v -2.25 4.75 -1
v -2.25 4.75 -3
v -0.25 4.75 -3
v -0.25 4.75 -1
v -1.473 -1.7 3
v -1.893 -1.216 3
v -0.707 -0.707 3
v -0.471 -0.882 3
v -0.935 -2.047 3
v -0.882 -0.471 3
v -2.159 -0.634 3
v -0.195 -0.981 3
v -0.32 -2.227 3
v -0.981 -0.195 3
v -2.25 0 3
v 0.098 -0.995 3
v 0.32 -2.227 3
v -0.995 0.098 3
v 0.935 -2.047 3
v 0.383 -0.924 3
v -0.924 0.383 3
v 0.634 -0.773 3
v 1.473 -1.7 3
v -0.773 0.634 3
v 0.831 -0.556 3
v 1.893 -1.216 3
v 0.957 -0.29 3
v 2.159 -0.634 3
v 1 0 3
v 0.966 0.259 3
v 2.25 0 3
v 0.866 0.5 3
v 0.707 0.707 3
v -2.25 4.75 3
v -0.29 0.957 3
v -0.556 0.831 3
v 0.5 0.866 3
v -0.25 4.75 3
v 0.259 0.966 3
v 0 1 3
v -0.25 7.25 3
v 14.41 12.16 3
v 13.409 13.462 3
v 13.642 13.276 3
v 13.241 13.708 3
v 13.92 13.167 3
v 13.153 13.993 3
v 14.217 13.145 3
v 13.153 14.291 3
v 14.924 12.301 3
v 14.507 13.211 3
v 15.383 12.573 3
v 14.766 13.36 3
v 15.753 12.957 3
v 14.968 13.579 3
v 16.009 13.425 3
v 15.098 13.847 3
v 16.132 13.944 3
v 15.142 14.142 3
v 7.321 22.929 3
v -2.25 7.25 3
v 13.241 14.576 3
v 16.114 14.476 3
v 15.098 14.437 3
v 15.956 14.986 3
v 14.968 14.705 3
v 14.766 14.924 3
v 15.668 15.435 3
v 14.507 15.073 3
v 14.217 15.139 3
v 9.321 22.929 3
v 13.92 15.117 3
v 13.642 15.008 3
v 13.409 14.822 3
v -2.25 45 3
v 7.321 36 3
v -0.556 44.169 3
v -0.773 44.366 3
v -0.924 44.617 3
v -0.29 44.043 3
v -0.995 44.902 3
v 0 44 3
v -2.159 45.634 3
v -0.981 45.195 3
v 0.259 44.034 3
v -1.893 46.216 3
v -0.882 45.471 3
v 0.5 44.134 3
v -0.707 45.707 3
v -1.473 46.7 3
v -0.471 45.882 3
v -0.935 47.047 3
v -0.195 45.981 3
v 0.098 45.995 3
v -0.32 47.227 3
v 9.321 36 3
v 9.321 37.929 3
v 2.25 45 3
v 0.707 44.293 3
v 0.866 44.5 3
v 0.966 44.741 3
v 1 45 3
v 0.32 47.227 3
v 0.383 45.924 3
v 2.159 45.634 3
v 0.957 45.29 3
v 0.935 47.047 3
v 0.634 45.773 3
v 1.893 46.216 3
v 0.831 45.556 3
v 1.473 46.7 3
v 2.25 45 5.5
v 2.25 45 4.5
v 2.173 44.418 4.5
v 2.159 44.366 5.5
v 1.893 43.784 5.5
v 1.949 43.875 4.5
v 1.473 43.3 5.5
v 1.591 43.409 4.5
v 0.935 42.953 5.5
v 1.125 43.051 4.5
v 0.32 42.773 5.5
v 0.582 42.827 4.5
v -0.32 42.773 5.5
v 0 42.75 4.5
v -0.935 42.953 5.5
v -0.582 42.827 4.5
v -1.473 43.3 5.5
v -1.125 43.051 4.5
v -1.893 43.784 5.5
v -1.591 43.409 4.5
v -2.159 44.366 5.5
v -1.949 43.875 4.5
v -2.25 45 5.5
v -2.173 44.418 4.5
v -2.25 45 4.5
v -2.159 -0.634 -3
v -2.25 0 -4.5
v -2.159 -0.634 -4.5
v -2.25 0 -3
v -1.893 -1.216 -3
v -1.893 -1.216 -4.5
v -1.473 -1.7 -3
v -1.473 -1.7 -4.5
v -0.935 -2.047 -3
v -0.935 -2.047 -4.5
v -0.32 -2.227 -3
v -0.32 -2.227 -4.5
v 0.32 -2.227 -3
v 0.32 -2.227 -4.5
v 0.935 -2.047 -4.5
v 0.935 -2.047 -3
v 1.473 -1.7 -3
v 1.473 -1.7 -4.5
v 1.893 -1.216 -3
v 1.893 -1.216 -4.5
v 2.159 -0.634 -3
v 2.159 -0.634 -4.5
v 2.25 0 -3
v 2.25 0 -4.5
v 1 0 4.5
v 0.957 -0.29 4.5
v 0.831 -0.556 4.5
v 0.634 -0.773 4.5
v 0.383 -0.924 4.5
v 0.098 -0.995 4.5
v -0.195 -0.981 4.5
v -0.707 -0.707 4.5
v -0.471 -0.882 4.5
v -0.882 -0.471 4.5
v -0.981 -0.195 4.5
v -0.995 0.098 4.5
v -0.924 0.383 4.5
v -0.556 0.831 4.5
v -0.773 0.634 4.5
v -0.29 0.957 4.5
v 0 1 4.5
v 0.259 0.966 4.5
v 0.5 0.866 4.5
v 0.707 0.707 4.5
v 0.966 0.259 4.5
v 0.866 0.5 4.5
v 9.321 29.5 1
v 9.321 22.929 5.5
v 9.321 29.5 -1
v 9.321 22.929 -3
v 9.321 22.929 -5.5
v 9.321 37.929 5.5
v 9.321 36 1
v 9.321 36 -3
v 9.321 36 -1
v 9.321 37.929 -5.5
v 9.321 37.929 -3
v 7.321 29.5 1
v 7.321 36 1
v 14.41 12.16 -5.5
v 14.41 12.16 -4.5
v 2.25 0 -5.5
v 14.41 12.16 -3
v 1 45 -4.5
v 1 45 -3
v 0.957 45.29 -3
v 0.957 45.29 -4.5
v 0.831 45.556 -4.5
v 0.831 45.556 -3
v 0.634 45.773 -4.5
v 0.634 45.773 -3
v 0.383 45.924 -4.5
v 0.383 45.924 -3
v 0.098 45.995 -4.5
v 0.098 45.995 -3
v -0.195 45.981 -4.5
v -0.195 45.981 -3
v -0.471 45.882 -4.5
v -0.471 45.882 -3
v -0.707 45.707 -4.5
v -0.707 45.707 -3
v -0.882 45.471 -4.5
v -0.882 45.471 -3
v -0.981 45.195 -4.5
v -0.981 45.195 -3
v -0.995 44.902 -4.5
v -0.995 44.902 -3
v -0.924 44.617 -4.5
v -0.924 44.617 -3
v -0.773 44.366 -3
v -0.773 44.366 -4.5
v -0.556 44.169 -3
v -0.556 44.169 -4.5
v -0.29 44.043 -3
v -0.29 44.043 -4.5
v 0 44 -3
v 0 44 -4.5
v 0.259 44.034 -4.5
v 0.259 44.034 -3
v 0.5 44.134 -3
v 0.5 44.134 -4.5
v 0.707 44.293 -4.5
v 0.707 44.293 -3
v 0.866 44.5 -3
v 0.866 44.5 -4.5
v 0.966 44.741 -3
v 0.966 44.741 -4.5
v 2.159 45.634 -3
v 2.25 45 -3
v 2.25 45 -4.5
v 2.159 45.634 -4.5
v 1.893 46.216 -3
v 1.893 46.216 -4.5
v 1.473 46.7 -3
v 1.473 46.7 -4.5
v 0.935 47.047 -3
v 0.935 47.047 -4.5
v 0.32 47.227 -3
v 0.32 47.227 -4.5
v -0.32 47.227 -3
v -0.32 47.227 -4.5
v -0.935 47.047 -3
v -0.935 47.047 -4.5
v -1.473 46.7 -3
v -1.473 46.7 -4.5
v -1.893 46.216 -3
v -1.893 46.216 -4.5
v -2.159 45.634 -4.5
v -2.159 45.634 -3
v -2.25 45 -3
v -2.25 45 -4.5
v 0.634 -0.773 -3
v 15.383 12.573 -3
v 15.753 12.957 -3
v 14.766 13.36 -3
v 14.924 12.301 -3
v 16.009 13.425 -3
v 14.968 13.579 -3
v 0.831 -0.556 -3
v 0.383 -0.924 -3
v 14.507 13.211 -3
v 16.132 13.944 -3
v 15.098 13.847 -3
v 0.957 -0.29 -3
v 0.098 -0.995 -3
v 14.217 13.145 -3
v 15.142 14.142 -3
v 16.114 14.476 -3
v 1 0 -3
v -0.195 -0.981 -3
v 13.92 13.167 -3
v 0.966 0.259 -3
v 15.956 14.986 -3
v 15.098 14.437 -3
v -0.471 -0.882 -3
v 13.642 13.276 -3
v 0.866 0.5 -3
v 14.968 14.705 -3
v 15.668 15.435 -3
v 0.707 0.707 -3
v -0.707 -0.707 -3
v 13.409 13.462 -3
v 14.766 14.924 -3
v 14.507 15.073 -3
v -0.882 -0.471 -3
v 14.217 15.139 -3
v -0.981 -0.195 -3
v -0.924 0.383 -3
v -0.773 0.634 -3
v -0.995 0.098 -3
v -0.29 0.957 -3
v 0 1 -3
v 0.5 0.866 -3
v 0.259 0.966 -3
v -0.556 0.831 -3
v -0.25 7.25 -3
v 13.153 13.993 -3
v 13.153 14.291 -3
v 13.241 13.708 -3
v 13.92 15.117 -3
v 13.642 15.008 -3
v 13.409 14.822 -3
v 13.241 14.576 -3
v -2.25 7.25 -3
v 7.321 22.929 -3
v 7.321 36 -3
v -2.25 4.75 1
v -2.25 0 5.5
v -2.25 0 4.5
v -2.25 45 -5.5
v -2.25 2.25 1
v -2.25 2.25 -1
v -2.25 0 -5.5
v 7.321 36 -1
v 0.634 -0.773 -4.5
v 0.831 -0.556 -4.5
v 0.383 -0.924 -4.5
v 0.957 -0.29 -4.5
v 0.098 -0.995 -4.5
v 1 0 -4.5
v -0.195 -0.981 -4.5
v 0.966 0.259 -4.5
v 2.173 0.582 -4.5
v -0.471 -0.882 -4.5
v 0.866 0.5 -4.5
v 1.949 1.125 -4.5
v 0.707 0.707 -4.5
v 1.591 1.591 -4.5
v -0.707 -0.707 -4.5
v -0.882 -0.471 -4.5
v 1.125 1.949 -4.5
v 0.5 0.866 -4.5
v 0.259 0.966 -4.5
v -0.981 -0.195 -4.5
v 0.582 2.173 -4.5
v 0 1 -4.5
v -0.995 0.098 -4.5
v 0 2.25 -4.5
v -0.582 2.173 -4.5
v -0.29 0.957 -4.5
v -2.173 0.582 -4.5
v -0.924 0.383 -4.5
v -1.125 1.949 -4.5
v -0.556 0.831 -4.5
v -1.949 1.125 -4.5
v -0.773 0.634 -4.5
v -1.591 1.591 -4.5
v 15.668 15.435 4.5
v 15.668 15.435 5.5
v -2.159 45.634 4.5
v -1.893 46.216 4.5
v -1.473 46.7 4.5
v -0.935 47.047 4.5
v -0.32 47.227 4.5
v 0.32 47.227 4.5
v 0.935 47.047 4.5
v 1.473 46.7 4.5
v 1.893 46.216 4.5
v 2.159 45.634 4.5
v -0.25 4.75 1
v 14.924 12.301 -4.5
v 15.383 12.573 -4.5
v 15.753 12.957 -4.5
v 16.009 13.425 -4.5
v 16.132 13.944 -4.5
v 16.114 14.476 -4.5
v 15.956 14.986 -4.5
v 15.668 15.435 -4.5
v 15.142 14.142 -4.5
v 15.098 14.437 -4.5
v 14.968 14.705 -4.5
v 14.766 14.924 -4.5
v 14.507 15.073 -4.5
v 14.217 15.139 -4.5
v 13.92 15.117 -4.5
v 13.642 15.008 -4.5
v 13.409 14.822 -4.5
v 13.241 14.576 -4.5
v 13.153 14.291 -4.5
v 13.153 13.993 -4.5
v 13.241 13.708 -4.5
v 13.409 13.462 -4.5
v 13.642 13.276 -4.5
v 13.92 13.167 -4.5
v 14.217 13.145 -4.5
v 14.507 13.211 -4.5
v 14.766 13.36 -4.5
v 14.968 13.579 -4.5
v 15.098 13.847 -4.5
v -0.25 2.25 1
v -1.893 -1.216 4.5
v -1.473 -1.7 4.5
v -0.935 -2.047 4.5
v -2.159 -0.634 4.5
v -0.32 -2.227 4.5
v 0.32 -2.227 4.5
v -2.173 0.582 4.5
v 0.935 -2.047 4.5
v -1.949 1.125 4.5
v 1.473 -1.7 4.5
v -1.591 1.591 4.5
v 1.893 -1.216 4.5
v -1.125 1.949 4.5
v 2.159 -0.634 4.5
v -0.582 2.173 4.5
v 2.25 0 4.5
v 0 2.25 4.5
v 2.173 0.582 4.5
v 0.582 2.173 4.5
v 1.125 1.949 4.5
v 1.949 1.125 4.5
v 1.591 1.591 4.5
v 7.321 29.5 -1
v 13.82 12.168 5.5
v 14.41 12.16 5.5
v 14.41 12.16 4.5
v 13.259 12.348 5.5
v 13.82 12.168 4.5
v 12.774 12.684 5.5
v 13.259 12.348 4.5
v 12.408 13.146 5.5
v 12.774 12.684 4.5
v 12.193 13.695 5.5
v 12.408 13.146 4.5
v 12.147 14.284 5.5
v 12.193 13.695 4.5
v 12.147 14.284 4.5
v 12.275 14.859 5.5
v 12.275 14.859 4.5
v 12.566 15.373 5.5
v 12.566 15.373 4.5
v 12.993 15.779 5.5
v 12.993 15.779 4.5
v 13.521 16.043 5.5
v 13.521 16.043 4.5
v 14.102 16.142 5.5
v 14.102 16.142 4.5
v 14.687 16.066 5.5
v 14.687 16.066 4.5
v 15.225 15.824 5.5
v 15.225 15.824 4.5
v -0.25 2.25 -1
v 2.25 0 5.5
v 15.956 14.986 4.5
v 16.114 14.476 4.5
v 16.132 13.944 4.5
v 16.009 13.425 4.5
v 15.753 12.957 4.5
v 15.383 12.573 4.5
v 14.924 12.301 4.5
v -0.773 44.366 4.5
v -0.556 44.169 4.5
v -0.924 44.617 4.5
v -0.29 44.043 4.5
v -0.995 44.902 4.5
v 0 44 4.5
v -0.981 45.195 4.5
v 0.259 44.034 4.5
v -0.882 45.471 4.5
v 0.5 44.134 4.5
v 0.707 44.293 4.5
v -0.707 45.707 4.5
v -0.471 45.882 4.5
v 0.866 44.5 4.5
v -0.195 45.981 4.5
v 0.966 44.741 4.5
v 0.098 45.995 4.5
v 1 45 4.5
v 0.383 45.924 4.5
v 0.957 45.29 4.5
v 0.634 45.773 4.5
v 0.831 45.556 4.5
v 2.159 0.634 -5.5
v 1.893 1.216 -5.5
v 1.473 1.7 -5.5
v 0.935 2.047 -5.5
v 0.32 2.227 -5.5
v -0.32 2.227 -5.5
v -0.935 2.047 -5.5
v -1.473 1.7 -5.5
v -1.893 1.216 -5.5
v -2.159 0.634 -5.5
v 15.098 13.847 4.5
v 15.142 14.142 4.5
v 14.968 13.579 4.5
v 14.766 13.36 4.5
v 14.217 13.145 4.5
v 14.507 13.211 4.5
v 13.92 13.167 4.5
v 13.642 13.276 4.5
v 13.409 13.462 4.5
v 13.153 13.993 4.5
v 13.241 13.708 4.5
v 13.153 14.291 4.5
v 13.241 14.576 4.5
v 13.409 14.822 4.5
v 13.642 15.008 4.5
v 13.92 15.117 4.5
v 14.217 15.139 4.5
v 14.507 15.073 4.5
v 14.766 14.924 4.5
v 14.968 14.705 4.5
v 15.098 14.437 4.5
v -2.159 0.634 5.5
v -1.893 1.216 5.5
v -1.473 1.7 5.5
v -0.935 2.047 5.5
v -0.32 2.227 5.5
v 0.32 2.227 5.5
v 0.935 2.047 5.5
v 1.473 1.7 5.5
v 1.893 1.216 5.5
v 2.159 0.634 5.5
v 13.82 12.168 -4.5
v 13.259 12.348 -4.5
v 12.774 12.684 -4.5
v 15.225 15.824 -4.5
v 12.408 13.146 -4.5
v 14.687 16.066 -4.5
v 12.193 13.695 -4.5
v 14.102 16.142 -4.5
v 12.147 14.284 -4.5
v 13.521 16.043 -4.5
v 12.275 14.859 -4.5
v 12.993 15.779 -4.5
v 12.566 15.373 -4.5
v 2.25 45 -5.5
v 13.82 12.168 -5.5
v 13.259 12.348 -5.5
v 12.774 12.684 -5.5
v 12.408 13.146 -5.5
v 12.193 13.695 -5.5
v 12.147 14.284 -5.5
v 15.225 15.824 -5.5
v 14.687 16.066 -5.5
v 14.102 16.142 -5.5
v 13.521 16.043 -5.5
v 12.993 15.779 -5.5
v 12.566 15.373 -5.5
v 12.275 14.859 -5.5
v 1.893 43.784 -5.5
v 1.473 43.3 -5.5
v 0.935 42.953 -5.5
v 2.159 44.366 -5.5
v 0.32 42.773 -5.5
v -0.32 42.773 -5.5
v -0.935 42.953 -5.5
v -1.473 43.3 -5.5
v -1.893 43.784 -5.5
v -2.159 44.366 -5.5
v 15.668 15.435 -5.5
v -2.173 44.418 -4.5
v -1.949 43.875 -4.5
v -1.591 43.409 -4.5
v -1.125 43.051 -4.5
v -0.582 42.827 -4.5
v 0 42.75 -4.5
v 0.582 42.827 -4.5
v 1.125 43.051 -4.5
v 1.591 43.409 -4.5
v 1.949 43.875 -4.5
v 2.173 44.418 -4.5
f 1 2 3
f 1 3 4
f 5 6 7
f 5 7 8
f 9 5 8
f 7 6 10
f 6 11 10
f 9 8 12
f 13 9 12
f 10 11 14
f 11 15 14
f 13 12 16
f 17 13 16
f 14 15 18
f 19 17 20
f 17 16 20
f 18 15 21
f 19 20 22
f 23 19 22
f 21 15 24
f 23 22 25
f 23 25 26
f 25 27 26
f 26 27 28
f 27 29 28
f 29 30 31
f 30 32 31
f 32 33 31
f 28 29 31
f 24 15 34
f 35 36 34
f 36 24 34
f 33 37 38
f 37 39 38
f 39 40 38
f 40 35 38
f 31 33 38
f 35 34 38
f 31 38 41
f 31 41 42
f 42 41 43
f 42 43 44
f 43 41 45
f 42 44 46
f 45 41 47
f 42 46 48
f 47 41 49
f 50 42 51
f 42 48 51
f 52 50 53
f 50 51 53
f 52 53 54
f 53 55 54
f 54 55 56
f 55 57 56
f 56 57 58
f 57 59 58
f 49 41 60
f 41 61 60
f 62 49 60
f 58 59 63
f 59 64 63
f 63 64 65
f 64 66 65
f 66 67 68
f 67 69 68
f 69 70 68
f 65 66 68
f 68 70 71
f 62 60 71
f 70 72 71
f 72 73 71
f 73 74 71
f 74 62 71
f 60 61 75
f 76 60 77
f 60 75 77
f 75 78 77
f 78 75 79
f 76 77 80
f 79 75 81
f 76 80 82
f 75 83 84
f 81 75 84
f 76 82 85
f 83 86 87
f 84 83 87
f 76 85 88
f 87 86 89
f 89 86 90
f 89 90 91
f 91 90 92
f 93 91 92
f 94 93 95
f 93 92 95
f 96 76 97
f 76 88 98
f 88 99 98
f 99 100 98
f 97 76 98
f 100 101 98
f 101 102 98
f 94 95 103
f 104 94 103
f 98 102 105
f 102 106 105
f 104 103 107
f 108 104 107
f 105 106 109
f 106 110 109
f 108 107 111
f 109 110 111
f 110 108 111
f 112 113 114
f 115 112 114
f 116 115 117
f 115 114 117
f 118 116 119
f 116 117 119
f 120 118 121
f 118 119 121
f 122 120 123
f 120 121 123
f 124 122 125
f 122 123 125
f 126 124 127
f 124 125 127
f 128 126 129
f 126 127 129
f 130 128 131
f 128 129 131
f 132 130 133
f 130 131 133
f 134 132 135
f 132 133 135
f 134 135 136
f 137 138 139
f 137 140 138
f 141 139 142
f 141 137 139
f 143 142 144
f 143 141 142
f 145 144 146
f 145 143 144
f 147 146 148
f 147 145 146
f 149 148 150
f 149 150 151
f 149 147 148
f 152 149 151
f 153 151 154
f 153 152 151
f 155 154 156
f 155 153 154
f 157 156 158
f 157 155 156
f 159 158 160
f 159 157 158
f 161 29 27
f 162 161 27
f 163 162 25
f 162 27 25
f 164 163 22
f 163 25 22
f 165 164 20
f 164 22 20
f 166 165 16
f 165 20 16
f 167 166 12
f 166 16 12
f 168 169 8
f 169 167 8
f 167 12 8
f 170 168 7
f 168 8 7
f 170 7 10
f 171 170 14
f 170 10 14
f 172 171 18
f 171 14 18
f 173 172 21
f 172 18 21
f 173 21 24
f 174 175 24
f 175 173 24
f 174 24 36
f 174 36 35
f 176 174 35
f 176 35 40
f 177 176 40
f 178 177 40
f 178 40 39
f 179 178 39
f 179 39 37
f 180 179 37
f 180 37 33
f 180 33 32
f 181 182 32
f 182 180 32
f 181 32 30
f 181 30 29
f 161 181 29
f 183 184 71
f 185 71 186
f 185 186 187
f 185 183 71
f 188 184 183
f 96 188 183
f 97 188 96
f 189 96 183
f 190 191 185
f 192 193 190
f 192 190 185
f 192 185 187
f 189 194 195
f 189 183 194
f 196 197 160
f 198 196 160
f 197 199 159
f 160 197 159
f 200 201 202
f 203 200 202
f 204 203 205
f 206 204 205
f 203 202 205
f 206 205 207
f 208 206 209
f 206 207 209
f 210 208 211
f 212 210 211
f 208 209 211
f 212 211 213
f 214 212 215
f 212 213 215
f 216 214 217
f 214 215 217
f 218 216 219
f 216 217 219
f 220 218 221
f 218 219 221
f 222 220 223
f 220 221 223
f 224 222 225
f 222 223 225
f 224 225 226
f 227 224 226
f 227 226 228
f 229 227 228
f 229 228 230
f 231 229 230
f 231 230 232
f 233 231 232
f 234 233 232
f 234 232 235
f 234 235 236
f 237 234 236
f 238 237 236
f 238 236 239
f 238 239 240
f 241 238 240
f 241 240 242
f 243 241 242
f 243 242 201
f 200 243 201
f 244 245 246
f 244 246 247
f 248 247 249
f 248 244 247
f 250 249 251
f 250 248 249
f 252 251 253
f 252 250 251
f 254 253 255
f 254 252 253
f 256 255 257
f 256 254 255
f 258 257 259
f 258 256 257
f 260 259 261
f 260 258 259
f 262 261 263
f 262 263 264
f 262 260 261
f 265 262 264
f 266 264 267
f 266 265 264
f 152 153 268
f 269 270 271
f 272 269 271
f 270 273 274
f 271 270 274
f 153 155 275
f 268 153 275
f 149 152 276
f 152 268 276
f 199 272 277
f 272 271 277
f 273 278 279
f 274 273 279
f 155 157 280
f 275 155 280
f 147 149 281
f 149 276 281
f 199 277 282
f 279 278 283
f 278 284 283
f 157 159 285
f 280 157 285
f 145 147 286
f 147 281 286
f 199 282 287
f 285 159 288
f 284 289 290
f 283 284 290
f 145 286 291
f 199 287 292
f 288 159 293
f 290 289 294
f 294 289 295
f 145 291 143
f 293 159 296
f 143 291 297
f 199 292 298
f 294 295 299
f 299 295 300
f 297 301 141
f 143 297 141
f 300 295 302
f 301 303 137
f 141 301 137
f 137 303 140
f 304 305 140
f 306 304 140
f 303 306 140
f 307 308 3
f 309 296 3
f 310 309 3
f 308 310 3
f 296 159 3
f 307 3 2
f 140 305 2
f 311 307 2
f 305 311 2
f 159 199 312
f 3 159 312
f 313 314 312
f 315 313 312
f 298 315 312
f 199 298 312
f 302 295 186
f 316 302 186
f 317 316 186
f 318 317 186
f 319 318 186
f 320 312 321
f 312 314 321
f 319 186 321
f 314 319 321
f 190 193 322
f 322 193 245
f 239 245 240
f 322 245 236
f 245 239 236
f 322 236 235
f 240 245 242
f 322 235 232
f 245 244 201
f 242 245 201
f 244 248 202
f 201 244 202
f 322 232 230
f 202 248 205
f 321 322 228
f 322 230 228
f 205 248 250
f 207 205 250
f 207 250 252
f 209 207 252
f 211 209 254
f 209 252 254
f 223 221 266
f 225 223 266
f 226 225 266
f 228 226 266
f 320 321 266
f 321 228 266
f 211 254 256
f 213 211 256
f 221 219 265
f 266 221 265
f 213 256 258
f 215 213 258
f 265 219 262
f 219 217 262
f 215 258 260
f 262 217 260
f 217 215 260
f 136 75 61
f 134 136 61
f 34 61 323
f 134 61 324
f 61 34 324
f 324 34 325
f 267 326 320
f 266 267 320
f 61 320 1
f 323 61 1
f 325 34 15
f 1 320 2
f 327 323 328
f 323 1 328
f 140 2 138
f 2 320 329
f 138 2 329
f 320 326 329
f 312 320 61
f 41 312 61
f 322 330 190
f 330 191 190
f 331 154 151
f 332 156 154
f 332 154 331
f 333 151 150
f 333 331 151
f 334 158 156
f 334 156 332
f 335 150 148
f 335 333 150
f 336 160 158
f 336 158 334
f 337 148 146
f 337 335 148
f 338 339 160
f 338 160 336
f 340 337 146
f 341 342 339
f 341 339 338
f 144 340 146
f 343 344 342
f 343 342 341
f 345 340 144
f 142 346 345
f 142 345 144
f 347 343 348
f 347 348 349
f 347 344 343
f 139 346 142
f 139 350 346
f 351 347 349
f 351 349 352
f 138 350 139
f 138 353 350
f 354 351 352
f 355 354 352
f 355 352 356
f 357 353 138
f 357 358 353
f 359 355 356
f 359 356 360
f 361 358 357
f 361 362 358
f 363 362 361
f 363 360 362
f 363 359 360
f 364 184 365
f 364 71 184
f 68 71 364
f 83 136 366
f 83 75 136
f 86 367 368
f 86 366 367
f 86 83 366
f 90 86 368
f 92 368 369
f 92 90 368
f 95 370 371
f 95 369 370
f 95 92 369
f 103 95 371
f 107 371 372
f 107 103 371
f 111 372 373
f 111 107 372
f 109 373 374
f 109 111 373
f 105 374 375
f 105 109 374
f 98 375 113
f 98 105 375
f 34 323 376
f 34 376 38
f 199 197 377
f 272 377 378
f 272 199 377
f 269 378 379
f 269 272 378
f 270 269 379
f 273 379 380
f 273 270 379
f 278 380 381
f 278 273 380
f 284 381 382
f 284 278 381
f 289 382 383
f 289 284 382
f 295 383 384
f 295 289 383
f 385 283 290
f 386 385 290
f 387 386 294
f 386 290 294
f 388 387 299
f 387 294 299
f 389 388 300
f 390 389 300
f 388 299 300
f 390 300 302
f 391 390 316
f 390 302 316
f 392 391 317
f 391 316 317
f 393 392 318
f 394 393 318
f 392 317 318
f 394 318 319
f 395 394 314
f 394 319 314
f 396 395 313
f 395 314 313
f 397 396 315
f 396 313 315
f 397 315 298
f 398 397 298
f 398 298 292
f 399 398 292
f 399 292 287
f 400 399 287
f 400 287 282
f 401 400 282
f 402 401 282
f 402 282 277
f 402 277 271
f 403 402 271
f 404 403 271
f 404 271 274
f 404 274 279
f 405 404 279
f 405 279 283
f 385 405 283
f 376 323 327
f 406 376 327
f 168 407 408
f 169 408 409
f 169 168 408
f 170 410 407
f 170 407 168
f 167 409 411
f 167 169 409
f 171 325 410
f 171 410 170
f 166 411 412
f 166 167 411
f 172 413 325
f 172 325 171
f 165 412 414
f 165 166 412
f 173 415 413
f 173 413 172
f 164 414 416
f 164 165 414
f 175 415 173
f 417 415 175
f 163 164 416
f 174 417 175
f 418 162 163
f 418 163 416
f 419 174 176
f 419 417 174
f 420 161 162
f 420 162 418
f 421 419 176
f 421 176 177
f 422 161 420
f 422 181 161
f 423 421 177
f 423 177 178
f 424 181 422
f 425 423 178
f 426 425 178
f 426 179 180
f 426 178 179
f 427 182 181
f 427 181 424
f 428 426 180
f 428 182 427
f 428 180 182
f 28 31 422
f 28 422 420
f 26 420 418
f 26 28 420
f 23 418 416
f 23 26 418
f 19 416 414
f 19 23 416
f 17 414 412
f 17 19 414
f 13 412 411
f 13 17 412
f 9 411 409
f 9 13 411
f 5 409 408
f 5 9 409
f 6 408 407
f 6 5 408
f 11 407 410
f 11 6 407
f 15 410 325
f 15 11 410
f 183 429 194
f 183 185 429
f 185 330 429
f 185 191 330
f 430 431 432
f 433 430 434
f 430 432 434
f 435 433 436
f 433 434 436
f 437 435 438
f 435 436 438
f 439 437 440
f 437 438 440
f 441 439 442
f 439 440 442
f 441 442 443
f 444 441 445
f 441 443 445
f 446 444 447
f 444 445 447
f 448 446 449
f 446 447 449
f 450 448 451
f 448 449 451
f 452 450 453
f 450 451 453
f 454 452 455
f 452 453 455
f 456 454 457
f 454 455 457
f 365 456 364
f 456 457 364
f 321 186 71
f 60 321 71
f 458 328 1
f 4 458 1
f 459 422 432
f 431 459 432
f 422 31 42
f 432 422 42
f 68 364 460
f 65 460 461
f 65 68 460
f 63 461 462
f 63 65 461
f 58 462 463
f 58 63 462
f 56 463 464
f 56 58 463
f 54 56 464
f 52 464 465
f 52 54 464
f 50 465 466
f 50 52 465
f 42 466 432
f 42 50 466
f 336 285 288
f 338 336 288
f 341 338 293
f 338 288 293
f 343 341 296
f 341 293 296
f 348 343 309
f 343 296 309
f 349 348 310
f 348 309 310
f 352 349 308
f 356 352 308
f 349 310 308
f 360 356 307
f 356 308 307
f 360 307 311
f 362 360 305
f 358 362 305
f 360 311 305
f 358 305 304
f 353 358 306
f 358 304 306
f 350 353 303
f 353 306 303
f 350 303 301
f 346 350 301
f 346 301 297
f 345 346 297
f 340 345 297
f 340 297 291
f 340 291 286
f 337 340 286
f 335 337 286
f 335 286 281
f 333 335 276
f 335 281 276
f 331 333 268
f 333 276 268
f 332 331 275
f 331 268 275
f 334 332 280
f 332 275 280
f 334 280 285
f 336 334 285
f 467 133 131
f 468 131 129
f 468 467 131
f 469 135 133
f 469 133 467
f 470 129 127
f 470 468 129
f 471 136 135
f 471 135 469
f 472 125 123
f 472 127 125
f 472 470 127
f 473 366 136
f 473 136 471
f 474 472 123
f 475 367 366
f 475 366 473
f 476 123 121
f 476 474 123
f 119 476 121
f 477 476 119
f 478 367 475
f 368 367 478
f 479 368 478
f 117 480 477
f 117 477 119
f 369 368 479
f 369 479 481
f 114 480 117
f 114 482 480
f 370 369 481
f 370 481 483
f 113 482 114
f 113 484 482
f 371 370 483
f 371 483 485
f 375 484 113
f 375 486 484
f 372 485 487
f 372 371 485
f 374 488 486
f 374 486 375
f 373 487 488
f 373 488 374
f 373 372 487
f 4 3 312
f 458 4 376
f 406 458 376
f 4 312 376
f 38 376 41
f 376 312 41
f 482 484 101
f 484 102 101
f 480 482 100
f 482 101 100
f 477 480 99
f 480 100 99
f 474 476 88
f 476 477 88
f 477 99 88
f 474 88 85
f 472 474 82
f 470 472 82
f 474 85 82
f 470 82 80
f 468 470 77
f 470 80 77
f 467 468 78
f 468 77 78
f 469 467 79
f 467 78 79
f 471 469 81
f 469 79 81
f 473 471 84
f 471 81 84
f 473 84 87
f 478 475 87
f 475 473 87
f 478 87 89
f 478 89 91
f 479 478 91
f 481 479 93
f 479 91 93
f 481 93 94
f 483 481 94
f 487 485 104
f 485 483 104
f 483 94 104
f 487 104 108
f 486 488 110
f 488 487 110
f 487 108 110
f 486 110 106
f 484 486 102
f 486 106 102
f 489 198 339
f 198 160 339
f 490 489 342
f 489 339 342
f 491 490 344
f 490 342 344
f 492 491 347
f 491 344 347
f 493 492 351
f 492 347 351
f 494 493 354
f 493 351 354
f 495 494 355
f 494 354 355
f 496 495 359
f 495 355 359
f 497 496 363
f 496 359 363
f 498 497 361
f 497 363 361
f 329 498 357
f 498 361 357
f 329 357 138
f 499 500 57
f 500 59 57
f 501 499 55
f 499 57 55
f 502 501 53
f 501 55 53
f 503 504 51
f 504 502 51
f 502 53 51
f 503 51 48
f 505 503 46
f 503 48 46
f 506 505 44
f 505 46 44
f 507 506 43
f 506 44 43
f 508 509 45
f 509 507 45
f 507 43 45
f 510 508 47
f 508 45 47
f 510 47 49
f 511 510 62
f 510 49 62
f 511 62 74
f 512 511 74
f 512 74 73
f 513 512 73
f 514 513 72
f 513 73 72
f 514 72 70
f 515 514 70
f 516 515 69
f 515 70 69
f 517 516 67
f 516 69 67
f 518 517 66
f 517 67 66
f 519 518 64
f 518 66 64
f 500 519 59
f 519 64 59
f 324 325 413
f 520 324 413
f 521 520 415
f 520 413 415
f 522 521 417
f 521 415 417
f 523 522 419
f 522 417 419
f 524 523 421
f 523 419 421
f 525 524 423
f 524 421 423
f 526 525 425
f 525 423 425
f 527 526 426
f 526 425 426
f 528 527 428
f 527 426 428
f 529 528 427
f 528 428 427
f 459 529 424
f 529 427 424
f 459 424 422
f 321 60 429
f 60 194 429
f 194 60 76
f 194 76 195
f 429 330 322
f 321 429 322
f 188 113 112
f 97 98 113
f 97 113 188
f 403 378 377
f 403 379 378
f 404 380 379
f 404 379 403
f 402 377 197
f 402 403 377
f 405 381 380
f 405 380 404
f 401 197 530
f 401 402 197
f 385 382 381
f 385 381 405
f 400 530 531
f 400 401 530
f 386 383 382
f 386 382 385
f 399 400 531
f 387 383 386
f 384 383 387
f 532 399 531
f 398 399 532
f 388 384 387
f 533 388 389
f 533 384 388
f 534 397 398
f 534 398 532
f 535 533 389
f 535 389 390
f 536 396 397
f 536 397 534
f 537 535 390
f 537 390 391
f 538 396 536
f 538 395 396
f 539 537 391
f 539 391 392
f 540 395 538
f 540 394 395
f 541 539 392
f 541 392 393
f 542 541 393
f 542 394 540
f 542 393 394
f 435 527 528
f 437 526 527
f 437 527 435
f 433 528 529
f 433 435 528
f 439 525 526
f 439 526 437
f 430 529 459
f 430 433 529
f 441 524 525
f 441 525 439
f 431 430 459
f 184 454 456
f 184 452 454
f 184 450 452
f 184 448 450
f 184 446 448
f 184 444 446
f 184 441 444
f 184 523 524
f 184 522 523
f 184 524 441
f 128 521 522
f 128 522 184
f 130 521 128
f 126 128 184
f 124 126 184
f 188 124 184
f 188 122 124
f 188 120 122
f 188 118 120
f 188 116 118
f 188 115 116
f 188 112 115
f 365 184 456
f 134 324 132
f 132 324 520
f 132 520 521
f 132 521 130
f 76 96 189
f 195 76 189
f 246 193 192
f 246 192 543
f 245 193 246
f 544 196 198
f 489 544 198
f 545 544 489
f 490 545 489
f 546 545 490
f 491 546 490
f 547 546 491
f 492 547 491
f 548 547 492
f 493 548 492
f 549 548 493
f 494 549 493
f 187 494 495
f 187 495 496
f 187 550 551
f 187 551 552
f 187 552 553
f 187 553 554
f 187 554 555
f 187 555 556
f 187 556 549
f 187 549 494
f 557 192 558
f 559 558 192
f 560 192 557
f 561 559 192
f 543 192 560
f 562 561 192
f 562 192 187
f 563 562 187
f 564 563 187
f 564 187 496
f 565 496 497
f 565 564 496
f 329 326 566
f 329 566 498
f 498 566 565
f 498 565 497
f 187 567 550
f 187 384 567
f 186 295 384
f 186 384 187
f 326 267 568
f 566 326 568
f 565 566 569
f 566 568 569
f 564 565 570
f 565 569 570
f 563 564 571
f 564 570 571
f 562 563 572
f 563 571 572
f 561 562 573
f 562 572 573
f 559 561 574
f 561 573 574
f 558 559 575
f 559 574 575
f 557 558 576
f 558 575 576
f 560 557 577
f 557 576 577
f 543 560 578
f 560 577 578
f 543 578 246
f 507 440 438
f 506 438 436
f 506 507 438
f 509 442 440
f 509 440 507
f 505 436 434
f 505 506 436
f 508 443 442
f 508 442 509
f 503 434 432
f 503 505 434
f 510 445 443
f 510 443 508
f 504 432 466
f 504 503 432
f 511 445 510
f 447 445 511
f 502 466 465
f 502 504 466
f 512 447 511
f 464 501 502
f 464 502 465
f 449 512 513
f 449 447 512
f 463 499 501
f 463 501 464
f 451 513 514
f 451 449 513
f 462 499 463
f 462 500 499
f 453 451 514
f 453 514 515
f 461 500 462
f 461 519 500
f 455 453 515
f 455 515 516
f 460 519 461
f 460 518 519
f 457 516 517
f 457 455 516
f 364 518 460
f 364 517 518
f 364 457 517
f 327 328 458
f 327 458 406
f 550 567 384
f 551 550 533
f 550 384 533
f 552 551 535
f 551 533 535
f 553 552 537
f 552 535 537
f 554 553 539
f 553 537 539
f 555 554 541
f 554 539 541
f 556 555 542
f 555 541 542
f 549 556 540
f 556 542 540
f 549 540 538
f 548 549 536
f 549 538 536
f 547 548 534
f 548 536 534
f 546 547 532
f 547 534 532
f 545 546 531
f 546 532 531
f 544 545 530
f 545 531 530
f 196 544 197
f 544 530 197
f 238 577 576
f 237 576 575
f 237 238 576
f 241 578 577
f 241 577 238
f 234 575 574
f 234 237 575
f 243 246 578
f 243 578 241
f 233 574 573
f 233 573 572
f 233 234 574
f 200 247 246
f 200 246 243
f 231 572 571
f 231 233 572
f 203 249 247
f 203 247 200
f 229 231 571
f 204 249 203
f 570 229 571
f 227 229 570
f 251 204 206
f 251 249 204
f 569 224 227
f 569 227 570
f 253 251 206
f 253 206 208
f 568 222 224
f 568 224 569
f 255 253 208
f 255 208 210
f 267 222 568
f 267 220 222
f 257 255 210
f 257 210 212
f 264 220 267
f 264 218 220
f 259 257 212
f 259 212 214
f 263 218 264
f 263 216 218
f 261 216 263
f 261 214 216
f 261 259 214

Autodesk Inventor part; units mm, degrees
ref_plane "YZ Plane" through (0, 0, 0) normal (1, 0, 0) x (0, 1, 0)
ref_plane "XZ Plane" through (0, 0, 0) normal (0, 1, 0) x (-1, 0, 0)
sketch "Sketch1" plane through (0, 0, 0) normal (0, 0, 1) x (1, 0, 0)
  line L0 (0, 0) -> (0, 45)
  line L1 (0, 0) -> (14.1421, 14.1421)
  line L2 (0, 0) -> (20, 0) construction
  line L3 (14.1421, 14.1421) -> (0, 14.1421)
  circle A0 centre (0, 0) radius 1
  circle A1 centre (14.1421, 14.1421) radius 1
  circle A2 centre (0, 45) radius 1
  circle A3 centre (0, 0) radius 2.25
  circle A4 centre (0, 45) radius 2.25
  dimension "d0" = 45
  dimension "d1" = 20
  dimension "d2" = 45
  dimension "d3" = 2
  dimension "d4" = 2
  dimension "d5" = 2
  dimension "d6" = 4.5
  dimension "d10" = 4.5
ref_plane "Work Plane1" through (0, 0, 3) normal (0, 0, 1) x (1, 0, 0)
sketch "Sketch2" plane through (0, 0, 3) normal (0, 0, 1) x (1, 0, 0)
  circle A0 centre (0, 0) radius 1 projected
  circle A1 centre (0, 0) radius 2.25 projected
  circle A2 centre (14.1421, 14.1421) radius 1 projected
  circle A3 centre (0, 45) radius 1 projected
  circle A4 centre (0, 45) radius 2.25 projected
  line L0 (0, 0) -> (0, 45) projected
extrude "Extrusion1" add sketch "Sketch2" along normal blind 1.5 contours A1
sketch "Sketch3" plane through (0, 0, 3) normal (0, 0, 1) x (1, 0, 0)
  point P0 (0, 0)
extrude "Extrusion2" add sketch "Sketch2" along normal blind 1.5 contours A4
sketch "Sketch4" plane through (0, 0, 3) normal (0, 0, 1) x (1, 0, 0)
  circle A0 centre (0, 0) radius 2.25 projected
  line L0 (-2.25, 0) -> (-2.25, 45)
  circle A1 centre (0, 45) radius 2.25 projected
  line L1 (2.25, 45) -> (9.3211, 37.9289)
  line L2 (2.25, 45) -> (12.25, 45) construction
  line L3 (9.3211, 37.9289) -> (9.3211, 22.9289)
  dimension "d13" = 10
  dimension "d14" = 45
  dimension "d15" = 15
sketch "Sketch5" plane through (0, 0, 3) normal (0, 0, 1) x (1, 0, 0)
  circle A0 centre (14.1421, 14.1421) radius 1 projected
  circle A1 centre (14.1421, 14.1421) radius 2
  point P0 (0, 0)
  dimension "d16" = 4
extrude "Extrusion3" add sketch "Sketch5" along normal blind 1.5
sketch "Sketch6" plane through (0, 0, 3) normal (0, 0, 1) x (1, 0, 0)
  circle A0 centre (0, 45) radius 2.25 projected
  line L0 (2.25, 45) -> (9.3211, 37.9289)
  line L1 (2.25, 45) -> (12.25, 45) construction
  line L2 (9.3211, 37.9289) -> (9.3211, 22.9289)
  line L3 (9.3211, 22.9289) -> (15.6683, 15.4347)
  circle A1 centre (14.1421, 14.1421) radius 2 projected
  line L4 (-2.25, 45) -> (-2.25, 0)
  circle A2 centre (0, 0) radius 2.25 projected
  circle A3 centre (14.1421, 14.1421) radius 2 projected
  circle A4 centre (14.1421, 14.1421) radius 1 projected
  line L5 (2.25, 0) -> (14.4102, 12.1602)
  line L6 (2.25, 0) -> (19.4471, 0) construction
  arc A5 (-2.25, 45) -> (2.25, 45) centre (0, 45) ccw
  line L7 (2.25, 45) -> (9.3211, 37.9289)
  line L8 (9.3211, 22.9289) -> (9.3211, 37.9289)
  line L9 (9.3211, 22.9289) -> (15.6683, 15.4347)
  line L10 (14.4102, 12.1602) -> (2.25, 0)
  circle A6 centre (14.1421, 14.1421) radius 2
  circle A7 centre (0, 0) radius 2.25
  line L11 (-2.25, 0) -> (-2.25, 45)
  circle A8 centre (0, 45) radius 2.25
  arc A9 (-2.25, 45) -> (2.25, 45) centre (0, 45) ccw
  arc A10 (15.6683, 15.4347) -> (14.4102, 12.1602) centre (14.1421, 14.1421) ccw
  arc A11 (2.25, 0) -> (-2.25, 0) centre (0, 0) ccw
  dimension "d19" = 10
  dimension "d20" = 45
  dimension "d21" = 15
  dimension "d22" = 45
extrude "Extrusion4" add sketch "Sketch6" along normal blind 2.5 contours L0 L2 L3 A1 L5 A2 L4 A0
mirror "Mirror1" about plane through (0, 0, 0) normal (0, 0, 1) of "Extrusion4"
mirror "Mirror2" about plane through (0, 0, 0) normal (0, 0, 1) of "Extrusion2", "Extrusion3", "Extrusion1"
sketch "Sketch7" plane through (-2.25, 0, -5.5) normal (-1, 0, 0) x (0, 0, 1)
  point P0 (5.5, 0)
sketch "Sketch9" plane through (9.3211, 22.9289, -3) normal (1, 0, 0) x (0, 0, -1)
  line L0 (-6, 13.0711) -> (0, 13.0711)
  line L1 (0, 13.0711) -> (0, 0)
  line L2 (0, 0) -> (-6, 0)
  line L3 (-6, 0) -> (-6, 13.0711)
  point P0 (-3, -22.9289)
extrude "Extrusion6" add sketch "Sketch9" against normal blind 2
sketch "Sketch12" plane through (9.3211, 22.9289, 5.5) normal (1, 0, 0) x (0, 0, -1)
  line L0 (8.5, 13.0711) -> (2.5, 13.0711) projected
  line L1 (6.5, 7.0711) -> (6.5, -16.9289) projected
  line L2 (4.5, 13.0711) -> (6.5, 13.0711)
  line L3 (6.5, 13.0711) -> (6.5, 6.5711)
  line L4 (6.5, 6.5711) -> (4.5, 6.5711)
  line L5 (4.5, 6.5711) -> (4.5, 13.0711)
  point P0 (5.5, -22.9289)
  point P1 (5.5, 13.0711)
  dimension "d50" = 6.5
extrude "Extrusion9" cut sketch "Sketch12" against normal blind 3
sketch "Sketch14" plane through (-2.25, 0, 3) normal (-1, 0, 0) x (0, 0, 1)
  line L0 (0, 45) -> (0, 0) projected
  line L1 (-6, 45) -> (-6, 0) projected
  line L2 (-6, 2.25) -> (0, 2.25)
  line L3 (-7.5, 0) -> (-7.5, 2.25) projected
  line L4 (-6, 2.25) -> (-6, 7.25)
  line L5 (-6, 7.25) -> (0, 7.25)
  line L6 (0, 0) -> (0, 12.1602) projected
  line L7 (-6, 4.75) -> (0, 4.75)
  line L8 (-2, 2.25) -> (-4, 2.25)
  line L9 (-4, 2.25) -> (-4, 4.75)
  line L10 (-4, 4.75) -> (-2, 4.75)
  line L11 (-2, 4.75) -> (-2, 2.25)
  line L12 (-6, 7.25) -> (0, 7.25)
  line L13 (0, 7.25) -> (0, 4.75)
  line L14 (0, 4.75) -> (-6, 4.75)
  line L15 (-6, 4.75) -> (-6, 7.25)
  line L16 (-4, 4.75) -> (-2, 4.75)
  line L17 (-2, 4.75) -> (-2, 2.25)
  line L18 (-2, 2.25) -> (-4, 2.25)
  line L19 (-4, 2.25) -> (-4, 4.75)
  point P0 (-3, 0)
  point P1 (-3, 2.25)
  dimension "d53" = 5
  dimension "d54" = 2
extrude "Extrusion10" add sketch "Sketch14" against normal blind 2 contours L0 L7 L1 L5 | L11 L2 L9 L7
ref_plane "Work Plane2" through (0, 0, 0) normal (0, 0, 1) x (1, 0, 0)
properties part number "Finger_Lower_main_1"
